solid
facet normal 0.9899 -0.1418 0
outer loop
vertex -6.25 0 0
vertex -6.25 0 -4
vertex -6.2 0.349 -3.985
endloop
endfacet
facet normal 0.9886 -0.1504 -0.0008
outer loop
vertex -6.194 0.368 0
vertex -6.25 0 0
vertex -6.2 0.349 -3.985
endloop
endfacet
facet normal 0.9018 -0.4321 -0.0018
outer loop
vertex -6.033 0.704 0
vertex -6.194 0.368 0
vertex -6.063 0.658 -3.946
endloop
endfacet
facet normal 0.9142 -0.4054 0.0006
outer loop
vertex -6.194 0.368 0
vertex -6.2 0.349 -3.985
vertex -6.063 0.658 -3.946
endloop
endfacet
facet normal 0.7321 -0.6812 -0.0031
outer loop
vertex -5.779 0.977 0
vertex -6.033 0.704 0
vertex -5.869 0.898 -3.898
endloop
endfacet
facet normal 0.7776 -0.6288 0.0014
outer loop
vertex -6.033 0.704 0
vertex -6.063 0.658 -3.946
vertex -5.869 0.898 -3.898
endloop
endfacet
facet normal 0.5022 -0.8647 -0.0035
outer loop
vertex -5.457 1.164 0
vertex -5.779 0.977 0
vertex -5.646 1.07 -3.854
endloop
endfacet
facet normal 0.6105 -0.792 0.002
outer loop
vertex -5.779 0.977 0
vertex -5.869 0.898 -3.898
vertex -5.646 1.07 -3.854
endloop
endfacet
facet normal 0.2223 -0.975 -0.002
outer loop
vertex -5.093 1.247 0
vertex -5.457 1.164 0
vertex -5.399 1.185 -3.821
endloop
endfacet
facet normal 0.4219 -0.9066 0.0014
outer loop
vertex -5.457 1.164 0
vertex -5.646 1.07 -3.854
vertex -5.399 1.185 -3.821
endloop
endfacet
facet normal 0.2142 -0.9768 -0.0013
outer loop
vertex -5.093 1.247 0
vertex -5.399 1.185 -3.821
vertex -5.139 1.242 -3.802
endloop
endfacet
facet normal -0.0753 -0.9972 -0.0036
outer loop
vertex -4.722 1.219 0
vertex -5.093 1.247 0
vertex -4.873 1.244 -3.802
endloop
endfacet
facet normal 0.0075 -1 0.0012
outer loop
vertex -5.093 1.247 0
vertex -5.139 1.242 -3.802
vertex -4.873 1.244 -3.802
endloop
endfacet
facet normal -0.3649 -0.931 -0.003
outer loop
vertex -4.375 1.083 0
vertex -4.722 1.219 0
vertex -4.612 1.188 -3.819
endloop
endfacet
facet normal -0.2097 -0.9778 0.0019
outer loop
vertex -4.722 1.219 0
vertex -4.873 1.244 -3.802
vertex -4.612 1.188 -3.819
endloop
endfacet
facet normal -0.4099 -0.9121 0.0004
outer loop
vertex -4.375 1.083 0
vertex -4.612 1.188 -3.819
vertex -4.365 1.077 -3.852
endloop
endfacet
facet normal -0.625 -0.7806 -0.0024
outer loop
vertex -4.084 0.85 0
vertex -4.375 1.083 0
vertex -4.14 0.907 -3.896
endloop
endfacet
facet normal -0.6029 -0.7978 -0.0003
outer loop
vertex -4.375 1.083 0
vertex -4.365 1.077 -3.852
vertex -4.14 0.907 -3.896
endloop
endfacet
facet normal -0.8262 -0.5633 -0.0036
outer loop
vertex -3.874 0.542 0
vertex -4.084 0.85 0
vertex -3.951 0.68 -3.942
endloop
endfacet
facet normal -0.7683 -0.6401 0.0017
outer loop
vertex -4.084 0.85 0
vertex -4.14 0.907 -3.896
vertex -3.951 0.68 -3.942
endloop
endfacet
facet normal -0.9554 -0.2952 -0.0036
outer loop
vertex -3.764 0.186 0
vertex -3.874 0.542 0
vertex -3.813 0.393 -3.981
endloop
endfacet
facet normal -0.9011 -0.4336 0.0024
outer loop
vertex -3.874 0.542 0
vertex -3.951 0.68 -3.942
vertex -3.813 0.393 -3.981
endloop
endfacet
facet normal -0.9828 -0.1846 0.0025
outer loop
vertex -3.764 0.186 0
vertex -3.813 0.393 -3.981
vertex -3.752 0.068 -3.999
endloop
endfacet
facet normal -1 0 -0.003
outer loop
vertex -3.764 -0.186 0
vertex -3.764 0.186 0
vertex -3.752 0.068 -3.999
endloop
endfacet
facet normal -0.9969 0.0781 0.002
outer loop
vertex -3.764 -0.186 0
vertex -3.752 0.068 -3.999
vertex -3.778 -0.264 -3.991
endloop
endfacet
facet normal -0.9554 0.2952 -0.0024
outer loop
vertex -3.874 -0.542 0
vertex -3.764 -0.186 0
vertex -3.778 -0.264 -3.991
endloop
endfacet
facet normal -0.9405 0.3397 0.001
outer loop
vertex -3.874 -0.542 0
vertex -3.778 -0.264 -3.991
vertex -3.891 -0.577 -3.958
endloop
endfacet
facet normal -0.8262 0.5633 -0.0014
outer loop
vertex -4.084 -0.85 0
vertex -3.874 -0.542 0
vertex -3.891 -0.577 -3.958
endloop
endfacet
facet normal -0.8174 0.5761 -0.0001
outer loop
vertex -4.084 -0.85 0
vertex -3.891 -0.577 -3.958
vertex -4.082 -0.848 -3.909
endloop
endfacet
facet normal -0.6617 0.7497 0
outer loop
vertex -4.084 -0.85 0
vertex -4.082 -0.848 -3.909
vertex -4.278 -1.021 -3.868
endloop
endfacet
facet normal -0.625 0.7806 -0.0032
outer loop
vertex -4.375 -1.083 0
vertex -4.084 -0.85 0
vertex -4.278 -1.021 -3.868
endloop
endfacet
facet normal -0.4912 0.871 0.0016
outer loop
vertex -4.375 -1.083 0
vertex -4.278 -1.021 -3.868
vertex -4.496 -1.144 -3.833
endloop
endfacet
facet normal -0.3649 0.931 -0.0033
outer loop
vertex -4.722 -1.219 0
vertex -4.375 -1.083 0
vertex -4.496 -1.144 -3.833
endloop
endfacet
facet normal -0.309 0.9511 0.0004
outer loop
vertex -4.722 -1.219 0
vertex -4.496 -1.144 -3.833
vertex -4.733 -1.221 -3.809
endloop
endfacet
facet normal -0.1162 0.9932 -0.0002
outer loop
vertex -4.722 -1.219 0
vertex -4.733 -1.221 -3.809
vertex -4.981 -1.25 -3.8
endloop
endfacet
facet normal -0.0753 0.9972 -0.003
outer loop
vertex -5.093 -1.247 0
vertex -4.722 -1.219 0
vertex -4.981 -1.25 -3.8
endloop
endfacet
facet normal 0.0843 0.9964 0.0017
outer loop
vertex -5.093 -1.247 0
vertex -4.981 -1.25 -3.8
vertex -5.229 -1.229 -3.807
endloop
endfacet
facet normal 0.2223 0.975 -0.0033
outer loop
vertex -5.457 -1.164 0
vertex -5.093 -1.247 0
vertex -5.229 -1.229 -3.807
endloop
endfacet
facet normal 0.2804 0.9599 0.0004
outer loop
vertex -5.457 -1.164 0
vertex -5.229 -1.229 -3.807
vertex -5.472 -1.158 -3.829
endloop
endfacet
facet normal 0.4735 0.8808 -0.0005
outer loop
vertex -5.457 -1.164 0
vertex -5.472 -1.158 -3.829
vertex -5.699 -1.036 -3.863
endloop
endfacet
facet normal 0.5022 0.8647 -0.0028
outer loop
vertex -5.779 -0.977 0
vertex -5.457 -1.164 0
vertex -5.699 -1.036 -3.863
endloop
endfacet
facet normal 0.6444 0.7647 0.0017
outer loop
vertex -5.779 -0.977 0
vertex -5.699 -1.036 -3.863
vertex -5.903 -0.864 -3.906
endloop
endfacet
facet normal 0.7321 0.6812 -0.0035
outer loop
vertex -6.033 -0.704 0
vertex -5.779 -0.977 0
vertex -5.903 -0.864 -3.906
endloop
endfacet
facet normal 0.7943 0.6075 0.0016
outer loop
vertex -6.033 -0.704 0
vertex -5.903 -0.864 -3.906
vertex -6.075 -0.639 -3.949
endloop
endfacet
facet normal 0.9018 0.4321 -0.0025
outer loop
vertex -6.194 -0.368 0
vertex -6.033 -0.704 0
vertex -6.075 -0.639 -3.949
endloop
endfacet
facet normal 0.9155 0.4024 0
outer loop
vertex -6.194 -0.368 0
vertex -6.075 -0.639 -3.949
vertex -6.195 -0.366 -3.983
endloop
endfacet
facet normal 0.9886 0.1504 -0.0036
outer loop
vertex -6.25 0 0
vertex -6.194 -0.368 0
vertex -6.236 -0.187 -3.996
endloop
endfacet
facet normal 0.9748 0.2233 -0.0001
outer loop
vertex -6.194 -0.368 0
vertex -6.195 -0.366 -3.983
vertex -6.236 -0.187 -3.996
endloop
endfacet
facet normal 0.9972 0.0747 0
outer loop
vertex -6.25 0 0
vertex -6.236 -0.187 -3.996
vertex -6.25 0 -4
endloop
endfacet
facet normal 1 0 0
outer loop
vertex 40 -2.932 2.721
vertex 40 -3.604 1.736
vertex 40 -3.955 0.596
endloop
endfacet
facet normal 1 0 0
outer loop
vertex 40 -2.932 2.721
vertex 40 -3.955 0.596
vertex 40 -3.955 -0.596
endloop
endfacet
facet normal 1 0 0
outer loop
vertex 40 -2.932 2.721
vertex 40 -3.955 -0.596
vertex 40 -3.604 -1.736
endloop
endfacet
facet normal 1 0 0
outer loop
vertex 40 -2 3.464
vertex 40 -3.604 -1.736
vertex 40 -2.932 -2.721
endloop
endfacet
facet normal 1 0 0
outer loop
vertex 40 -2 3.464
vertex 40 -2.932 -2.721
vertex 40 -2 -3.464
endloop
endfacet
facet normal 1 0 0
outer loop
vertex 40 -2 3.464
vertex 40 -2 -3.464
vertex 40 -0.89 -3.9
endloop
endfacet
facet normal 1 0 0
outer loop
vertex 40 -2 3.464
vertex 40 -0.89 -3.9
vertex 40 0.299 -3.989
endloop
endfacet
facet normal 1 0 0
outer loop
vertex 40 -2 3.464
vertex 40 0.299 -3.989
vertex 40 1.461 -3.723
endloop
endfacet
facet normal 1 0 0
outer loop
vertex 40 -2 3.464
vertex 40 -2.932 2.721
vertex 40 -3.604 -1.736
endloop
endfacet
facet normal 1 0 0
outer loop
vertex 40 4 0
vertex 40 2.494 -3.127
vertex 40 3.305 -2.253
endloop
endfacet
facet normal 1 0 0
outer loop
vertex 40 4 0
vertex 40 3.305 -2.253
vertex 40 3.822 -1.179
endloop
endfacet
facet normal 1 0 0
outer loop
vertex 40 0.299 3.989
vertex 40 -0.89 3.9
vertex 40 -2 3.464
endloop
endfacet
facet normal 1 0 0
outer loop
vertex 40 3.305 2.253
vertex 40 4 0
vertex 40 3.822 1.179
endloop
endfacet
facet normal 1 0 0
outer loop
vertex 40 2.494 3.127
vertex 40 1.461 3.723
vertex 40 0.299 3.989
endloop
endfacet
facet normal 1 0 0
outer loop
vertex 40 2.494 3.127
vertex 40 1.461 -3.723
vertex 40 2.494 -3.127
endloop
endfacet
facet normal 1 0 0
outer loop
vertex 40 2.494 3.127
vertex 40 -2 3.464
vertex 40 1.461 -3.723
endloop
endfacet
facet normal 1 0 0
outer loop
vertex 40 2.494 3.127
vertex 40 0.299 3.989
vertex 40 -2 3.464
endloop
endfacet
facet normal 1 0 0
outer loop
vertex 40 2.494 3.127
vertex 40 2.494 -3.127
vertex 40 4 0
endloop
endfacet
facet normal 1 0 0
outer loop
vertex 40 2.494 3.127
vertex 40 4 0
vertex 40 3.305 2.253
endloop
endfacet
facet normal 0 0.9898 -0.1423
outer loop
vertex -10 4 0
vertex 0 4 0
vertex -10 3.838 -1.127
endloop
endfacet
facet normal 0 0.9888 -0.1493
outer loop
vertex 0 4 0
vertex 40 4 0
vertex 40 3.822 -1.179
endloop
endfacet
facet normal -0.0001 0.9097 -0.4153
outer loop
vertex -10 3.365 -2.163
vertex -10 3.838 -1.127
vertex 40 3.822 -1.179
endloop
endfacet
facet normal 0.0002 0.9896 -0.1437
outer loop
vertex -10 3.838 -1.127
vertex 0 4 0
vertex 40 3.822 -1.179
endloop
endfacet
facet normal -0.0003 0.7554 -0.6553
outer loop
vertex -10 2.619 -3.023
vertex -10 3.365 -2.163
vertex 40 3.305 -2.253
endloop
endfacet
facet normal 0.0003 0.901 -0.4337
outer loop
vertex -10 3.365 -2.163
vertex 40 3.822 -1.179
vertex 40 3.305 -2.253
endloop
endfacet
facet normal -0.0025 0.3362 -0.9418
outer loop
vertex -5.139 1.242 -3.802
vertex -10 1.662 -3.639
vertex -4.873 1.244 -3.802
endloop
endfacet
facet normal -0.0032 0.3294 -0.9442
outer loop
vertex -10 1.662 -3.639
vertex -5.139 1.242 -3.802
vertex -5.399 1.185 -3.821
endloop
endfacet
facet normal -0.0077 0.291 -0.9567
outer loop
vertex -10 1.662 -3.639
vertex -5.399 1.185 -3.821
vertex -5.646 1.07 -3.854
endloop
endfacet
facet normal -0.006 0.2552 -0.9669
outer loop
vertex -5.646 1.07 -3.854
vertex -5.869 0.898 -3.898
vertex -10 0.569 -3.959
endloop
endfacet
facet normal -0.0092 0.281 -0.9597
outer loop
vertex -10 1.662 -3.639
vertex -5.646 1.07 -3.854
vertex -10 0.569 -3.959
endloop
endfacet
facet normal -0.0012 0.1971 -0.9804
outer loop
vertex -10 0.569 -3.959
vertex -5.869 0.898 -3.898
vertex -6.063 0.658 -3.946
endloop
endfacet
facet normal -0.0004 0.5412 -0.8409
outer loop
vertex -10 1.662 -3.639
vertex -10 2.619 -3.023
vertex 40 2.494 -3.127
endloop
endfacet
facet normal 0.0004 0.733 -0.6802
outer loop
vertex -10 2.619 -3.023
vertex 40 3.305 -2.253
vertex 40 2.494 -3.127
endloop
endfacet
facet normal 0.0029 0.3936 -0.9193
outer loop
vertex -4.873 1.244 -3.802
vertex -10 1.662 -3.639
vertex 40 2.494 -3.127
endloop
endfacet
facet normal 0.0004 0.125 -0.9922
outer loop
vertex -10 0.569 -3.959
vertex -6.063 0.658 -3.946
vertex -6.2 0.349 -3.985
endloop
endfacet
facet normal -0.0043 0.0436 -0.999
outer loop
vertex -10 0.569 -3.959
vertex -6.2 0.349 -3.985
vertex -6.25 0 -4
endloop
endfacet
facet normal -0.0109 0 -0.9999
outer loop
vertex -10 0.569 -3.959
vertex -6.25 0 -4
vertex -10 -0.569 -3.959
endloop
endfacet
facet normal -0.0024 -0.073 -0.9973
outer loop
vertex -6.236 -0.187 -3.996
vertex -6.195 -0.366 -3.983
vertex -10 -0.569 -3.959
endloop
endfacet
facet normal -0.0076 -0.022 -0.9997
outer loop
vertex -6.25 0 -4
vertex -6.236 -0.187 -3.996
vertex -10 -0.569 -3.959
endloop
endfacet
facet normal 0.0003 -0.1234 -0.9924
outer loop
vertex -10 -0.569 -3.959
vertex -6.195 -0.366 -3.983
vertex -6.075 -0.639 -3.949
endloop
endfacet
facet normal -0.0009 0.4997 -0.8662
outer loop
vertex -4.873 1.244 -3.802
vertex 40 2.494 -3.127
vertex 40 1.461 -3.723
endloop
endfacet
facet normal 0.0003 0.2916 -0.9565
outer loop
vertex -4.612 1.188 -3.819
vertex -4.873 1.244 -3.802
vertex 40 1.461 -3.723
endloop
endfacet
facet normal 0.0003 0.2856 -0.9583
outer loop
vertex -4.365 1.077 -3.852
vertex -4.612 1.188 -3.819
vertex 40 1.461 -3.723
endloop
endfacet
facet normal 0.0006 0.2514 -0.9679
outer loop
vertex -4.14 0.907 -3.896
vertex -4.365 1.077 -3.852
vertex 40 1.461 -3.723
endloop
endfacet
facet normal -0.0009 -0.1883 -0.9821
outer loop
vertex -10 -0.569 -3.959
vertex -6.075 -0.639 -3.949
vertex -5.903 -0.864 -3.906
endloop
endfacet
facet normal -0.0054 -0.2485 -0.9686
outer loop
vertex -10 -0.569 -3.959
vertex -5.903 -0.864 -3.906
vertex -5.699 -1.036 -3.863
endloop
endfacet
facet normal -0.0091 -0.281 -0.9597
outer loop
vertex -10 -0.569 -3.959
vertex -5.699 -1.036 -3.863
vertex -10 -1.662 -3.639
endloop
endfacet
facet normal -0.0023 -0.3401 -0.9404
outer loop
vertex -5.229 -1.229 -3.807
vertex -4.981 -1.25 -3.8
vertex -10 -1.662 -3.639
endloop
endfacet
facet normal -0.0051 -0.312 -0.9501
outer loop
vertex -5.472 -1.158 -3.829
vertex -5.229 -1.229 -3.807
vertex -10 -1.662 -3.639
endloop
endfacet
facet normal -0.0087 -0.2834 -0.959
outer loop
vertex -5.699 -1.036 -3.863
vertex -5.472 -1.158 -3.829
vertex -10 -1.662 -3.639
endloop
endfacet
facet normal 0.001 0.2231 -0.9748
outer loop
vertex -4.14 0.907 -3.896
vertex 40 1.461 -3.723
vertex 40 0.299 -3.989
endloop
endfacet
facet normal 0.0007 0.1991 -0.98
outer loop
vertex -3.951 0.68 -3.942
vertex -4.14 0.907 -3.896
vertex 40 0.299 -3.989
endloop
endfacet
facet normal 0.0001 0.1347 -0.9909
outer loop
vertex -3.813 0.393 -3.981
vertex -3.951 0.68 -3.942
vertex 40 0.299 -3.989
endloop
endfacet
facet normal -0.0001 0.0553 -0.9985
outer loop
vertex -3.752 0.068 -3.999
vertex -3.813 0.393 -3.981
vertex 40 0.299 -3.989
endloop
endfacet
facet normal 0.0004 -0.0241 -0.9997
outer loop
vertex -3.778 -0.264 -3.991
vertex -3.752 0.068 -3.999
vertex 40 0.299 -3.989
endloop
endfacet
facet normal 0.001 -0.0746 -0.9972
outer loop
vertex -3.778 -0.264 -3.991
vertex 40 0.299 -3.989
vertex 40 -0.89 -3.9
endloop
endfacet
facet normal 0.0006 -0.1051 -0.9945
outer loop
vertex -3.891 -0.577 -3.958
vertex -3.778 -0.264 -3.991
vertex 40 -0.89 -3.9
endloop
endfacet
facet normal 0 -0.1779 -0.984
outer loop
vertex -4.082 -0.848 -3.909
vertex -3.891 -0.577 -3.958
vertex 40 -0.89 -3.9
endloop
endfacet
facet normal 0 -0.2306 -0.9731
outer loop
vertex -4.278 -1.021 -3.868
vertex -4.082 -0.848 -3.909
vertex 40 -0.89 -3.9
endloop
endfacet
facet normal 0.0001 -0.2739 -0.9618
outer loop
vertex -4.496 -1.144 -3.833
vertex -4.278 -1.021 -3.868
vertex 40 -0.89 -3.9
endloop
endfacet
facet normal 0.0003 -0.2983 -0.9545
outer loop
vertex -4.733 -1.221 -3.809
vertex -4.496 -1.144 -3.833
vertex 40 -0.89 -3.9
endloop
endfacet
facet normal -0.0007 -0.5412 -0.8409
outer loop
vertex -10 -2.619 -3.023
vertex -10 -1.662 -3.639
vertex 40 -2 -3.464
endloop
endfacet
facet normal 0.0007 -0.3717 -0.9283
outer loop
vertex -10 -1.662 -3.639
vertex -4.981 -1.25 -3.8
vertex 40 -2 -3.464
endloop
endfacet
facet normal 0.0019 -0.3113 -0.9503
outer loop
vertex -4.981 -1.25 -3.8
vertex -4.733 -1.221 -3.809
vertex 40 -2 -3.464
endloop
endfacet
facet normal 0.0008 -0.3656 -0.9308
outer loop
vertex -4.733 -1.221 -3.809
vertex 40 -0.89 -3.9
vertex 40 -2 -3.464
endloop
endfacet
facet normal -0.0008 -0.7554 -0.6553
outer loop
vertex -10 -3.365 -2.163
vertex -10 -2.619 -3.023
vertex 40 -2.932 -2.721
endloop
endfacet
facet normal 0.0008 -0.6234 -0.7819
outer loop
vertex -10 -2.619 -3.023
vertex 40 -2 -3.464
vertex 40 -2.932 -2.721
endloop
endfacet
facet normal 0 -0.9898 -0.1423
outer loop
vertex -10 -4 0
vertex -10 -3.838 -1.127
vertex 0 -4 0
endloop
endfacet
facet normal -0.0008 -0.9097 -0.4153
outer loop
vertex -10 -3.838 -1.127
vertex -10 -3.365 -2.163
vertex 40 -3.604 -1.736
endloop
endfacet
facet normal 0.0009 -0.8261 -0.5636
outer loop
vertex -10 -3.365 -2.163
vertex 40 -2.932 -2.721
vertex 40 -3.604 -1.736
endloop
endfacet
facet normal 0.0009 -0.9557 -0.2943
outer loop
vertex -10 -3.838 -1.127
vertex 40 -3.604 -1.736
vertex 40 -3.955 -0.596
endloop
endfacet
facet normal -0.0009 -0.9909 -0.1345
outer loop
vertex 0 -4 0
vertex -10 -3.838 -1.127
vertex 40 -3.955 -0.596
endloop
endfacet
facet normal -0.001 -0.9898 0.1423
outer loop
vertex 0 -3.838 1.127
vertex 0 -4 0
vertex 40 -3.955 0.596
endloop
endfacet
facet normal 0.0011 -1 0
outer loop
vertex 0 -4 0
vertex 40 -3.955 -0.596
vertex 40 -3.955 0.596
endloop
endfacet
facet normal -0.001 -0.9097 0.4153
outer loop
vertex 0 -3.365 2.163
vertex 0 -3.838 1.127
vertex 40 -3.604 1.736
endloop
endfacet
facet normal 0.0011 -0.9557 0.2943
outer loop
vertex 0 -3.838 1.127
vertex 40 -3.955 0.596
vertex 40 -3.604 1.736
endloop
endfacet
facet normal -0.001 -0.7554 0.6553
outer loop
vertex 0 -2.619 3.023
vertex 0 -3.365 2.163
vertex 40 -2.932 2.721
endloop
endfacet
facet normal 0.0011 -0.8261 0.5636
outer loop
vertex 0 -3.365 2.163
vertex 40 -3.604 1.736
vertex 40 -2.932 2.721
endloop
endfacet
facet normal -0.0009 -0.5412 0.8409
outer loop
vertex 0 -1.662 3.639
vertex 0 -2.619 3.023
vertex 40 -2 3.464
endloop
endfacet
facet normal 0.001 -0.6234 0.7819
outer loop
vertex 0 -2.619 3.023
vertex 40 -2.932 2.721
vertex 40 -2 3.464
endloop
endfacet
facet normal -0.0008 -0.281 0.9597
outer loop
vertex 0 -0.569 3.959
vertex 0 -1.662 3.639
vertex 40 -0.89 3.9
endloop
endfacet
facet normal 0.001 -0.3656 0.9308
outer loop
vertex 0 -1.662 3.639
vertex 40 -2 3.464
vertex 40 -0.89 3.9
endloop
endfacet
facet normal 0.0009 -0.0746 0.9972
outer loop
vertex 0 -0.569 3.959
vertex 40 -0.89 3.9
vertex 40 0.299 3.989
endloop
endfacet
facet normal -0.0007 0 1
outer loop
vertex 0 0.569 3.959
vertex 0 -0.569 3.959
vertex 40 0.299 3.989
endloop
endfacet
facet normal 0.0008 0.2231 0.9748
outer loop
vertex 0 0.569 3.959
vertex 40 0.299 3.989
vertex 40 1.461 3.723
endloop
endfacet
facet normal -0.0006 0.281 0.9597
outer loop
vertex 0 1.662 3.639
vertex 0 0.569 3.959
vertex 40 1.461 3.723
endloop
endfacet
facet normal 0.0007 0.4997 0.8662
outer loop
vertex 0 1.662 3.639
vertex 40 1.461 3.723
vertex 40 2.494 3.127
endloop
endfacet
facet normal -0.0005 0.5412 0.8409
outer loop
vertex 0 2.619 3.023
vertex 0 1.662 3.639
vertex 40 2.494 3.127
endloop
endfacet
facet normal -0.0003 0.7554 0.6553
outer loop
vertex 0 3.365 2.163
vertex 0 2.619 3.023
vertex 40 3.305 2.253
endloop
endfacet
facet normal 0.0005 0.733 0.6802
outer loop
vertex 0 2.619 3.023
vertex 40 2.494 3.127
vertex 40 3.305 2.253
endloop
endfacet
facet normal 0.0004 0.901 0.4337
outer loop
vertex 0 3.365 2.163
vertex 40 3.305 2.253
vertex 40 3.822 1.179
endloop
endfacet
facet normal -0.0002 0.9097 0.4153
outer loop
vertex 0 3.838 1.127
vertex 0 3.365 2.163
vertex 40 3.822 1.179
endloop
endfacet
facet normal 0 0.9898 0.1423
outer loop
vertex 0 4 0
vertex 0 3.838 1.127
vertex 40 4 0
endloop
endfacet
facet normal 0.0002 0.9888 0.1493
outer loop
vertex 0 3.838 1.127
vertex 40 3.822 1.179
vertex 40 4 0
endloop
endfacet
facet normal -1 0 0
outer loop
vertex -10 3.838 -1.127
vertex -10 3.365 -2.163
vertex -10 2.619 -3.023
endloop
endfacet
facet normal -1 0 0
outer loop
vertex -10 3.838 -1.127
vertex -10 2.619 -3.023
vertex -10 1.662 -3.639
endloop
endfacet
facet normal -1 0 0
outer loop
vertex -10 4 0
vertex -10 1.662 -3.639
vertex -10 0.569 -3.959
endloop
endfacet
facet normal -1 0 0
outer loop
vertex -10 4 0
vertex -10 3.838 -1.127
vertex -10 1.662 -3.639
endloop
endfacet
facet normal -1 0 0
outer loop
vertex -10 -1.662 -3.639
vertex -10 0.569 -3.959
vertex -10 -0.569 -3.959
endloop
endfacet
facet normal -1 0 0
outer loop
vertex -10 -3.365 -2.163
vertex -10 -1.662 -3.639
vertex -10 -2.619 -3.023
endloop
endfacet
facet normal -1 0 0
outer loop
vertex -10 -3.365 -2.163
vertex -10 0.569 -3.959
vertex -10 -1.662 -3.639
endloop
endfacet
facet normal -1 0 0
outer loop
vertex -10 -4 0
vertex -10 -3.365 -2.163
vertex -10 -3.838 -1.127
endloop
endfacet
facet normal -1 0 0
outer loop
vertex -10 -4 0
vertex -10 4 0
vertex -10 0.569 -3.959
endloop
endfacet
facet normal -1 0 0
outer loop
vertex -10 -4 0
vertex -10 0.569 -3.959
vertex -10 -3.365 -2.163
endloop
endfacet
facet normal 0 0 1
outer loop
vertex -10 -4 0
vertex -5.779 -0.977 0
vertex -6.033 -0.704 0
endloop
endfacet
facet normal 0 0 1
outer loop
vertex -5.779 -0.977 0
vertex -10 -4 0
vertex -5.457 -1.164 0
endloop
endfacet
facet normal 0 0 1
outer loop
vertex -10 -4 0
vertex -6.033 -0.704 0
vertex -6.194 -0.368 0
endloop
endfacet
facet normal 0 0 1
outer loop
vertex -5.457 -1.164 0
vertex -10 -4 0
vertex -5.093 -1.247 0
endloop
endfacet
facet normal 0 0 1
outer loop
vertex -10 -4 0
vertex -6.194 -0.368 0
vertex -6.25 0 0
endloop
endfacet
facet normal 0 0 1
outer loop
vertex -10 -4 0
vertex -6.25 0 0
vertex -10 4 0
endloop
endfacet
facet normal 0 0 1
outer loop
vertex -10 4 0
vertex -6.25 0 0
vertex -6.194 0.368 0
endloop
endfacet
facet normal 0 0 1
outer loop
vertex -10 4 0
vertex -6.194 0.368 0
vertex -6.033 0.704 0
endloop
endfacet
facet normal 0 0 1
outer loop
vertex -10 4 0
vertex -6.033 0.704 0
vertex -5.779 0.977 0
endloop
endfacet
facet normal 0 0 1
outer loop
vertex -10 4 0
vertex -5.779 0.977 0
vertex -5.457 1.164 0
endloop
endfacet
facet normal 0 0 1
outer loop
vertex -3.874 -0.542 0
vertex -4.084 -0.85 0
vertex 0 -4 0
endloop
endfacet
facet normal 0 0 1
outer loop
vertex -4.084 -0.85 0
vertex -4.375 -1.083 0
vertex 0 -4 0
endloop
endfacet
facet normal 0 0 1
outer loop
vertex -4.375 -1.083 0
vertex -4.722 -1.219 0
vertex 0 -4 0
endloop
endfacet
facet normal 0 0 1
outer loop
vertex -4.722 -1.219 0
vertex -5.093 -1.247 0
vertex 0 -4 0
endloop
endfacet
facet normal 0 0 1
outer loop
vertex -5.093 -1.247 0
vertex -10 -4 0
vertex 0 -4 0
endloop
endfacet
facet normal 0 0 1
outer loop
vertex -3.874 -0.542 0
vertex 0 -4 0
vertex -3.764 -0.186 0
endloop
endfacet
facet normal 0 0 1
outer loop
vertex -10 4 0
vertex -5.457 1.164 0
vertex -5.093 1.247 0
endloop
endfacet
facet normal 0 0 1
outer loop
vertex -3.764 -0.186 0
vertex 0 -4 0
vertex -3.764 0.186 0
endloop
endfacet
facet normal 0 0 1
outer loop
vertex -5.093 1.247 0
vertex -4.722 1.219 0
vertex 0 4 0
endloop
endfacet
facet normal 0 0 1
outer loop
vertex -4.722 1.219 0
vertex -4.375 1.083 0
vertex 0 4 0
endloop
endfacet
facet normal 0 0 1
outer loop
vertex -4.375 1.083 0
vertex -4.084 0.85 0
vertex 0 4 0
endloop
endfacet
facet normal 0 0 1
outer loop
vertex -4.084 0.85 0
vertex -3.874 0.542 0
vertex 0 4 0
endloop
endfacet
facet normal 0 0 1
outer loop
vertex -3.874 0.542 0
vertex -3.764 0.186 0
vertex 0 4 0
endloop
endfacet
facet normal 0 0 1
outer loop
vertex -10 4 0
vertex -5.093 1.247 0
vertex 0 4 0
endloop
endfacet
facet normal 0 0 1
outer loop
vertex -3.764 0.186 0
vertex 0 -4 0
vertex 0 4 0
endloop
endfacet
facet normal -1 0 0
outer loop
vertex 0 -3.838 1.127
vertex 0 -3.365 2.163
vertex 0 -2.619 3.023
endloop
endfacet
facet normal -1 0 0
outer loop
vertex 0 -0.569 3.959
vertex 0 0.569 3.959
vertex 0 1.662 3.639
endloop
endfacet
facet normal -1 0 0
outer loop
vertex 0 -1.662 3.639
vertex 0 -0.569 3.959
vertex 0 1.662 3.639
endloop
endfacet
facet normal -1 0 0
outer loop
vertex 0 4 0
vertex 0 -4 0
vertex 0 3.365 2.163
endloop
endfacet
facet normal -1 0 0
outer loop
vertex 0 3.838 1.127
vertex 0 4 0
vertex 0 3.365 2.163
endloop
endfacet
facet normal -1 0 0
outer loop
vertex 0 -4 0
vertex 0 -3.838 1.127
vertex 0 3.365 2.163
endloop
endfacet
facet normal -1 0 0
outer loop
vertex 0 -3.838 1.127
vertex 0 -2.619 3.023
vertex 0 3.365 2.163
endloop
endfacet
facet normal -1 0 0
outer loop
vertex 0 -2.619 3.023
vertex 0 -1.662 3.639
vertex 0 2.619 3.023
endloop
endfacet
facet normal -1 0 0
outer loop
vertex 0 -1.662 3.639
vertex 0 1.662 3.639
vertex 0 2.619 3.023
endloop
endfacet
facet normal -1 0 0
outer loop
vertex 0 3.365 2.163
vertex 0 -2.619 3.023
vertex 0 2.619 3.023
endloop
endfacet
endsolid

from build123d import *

# Parameters (mm, degrees)
F0_R     = 4
F1_DEPTH = 40
F3_DEPTH = 10
F5_D     = 2.5


with BuildPart() as f1:
    # F0 (on Right) → F1 (new body)
    with BuildSketch(Plane.YZ):
        Circle(F0_R)
    extrude(amount=F1_DEPTH)

    # F2 (on face) → F3 (join)
    with BuildSketch(Plane(origin=(0, 0, 0), x_dir=(0, -1, 0), z_dir=(-1, 0, 0))):
        with BuildLine():
            Line((4, 0), (-4, 0))
            ThreePointArc((-4, 0), (0, -4), (4, 0))
        make_face()
    extrude(amount=F3_DEPTH)

    # F5 (through all)
    with Locations(Plane.XY):
        with Locations((-5, 0)):
            Hole(F5_D / 2)


solid = f1.part
